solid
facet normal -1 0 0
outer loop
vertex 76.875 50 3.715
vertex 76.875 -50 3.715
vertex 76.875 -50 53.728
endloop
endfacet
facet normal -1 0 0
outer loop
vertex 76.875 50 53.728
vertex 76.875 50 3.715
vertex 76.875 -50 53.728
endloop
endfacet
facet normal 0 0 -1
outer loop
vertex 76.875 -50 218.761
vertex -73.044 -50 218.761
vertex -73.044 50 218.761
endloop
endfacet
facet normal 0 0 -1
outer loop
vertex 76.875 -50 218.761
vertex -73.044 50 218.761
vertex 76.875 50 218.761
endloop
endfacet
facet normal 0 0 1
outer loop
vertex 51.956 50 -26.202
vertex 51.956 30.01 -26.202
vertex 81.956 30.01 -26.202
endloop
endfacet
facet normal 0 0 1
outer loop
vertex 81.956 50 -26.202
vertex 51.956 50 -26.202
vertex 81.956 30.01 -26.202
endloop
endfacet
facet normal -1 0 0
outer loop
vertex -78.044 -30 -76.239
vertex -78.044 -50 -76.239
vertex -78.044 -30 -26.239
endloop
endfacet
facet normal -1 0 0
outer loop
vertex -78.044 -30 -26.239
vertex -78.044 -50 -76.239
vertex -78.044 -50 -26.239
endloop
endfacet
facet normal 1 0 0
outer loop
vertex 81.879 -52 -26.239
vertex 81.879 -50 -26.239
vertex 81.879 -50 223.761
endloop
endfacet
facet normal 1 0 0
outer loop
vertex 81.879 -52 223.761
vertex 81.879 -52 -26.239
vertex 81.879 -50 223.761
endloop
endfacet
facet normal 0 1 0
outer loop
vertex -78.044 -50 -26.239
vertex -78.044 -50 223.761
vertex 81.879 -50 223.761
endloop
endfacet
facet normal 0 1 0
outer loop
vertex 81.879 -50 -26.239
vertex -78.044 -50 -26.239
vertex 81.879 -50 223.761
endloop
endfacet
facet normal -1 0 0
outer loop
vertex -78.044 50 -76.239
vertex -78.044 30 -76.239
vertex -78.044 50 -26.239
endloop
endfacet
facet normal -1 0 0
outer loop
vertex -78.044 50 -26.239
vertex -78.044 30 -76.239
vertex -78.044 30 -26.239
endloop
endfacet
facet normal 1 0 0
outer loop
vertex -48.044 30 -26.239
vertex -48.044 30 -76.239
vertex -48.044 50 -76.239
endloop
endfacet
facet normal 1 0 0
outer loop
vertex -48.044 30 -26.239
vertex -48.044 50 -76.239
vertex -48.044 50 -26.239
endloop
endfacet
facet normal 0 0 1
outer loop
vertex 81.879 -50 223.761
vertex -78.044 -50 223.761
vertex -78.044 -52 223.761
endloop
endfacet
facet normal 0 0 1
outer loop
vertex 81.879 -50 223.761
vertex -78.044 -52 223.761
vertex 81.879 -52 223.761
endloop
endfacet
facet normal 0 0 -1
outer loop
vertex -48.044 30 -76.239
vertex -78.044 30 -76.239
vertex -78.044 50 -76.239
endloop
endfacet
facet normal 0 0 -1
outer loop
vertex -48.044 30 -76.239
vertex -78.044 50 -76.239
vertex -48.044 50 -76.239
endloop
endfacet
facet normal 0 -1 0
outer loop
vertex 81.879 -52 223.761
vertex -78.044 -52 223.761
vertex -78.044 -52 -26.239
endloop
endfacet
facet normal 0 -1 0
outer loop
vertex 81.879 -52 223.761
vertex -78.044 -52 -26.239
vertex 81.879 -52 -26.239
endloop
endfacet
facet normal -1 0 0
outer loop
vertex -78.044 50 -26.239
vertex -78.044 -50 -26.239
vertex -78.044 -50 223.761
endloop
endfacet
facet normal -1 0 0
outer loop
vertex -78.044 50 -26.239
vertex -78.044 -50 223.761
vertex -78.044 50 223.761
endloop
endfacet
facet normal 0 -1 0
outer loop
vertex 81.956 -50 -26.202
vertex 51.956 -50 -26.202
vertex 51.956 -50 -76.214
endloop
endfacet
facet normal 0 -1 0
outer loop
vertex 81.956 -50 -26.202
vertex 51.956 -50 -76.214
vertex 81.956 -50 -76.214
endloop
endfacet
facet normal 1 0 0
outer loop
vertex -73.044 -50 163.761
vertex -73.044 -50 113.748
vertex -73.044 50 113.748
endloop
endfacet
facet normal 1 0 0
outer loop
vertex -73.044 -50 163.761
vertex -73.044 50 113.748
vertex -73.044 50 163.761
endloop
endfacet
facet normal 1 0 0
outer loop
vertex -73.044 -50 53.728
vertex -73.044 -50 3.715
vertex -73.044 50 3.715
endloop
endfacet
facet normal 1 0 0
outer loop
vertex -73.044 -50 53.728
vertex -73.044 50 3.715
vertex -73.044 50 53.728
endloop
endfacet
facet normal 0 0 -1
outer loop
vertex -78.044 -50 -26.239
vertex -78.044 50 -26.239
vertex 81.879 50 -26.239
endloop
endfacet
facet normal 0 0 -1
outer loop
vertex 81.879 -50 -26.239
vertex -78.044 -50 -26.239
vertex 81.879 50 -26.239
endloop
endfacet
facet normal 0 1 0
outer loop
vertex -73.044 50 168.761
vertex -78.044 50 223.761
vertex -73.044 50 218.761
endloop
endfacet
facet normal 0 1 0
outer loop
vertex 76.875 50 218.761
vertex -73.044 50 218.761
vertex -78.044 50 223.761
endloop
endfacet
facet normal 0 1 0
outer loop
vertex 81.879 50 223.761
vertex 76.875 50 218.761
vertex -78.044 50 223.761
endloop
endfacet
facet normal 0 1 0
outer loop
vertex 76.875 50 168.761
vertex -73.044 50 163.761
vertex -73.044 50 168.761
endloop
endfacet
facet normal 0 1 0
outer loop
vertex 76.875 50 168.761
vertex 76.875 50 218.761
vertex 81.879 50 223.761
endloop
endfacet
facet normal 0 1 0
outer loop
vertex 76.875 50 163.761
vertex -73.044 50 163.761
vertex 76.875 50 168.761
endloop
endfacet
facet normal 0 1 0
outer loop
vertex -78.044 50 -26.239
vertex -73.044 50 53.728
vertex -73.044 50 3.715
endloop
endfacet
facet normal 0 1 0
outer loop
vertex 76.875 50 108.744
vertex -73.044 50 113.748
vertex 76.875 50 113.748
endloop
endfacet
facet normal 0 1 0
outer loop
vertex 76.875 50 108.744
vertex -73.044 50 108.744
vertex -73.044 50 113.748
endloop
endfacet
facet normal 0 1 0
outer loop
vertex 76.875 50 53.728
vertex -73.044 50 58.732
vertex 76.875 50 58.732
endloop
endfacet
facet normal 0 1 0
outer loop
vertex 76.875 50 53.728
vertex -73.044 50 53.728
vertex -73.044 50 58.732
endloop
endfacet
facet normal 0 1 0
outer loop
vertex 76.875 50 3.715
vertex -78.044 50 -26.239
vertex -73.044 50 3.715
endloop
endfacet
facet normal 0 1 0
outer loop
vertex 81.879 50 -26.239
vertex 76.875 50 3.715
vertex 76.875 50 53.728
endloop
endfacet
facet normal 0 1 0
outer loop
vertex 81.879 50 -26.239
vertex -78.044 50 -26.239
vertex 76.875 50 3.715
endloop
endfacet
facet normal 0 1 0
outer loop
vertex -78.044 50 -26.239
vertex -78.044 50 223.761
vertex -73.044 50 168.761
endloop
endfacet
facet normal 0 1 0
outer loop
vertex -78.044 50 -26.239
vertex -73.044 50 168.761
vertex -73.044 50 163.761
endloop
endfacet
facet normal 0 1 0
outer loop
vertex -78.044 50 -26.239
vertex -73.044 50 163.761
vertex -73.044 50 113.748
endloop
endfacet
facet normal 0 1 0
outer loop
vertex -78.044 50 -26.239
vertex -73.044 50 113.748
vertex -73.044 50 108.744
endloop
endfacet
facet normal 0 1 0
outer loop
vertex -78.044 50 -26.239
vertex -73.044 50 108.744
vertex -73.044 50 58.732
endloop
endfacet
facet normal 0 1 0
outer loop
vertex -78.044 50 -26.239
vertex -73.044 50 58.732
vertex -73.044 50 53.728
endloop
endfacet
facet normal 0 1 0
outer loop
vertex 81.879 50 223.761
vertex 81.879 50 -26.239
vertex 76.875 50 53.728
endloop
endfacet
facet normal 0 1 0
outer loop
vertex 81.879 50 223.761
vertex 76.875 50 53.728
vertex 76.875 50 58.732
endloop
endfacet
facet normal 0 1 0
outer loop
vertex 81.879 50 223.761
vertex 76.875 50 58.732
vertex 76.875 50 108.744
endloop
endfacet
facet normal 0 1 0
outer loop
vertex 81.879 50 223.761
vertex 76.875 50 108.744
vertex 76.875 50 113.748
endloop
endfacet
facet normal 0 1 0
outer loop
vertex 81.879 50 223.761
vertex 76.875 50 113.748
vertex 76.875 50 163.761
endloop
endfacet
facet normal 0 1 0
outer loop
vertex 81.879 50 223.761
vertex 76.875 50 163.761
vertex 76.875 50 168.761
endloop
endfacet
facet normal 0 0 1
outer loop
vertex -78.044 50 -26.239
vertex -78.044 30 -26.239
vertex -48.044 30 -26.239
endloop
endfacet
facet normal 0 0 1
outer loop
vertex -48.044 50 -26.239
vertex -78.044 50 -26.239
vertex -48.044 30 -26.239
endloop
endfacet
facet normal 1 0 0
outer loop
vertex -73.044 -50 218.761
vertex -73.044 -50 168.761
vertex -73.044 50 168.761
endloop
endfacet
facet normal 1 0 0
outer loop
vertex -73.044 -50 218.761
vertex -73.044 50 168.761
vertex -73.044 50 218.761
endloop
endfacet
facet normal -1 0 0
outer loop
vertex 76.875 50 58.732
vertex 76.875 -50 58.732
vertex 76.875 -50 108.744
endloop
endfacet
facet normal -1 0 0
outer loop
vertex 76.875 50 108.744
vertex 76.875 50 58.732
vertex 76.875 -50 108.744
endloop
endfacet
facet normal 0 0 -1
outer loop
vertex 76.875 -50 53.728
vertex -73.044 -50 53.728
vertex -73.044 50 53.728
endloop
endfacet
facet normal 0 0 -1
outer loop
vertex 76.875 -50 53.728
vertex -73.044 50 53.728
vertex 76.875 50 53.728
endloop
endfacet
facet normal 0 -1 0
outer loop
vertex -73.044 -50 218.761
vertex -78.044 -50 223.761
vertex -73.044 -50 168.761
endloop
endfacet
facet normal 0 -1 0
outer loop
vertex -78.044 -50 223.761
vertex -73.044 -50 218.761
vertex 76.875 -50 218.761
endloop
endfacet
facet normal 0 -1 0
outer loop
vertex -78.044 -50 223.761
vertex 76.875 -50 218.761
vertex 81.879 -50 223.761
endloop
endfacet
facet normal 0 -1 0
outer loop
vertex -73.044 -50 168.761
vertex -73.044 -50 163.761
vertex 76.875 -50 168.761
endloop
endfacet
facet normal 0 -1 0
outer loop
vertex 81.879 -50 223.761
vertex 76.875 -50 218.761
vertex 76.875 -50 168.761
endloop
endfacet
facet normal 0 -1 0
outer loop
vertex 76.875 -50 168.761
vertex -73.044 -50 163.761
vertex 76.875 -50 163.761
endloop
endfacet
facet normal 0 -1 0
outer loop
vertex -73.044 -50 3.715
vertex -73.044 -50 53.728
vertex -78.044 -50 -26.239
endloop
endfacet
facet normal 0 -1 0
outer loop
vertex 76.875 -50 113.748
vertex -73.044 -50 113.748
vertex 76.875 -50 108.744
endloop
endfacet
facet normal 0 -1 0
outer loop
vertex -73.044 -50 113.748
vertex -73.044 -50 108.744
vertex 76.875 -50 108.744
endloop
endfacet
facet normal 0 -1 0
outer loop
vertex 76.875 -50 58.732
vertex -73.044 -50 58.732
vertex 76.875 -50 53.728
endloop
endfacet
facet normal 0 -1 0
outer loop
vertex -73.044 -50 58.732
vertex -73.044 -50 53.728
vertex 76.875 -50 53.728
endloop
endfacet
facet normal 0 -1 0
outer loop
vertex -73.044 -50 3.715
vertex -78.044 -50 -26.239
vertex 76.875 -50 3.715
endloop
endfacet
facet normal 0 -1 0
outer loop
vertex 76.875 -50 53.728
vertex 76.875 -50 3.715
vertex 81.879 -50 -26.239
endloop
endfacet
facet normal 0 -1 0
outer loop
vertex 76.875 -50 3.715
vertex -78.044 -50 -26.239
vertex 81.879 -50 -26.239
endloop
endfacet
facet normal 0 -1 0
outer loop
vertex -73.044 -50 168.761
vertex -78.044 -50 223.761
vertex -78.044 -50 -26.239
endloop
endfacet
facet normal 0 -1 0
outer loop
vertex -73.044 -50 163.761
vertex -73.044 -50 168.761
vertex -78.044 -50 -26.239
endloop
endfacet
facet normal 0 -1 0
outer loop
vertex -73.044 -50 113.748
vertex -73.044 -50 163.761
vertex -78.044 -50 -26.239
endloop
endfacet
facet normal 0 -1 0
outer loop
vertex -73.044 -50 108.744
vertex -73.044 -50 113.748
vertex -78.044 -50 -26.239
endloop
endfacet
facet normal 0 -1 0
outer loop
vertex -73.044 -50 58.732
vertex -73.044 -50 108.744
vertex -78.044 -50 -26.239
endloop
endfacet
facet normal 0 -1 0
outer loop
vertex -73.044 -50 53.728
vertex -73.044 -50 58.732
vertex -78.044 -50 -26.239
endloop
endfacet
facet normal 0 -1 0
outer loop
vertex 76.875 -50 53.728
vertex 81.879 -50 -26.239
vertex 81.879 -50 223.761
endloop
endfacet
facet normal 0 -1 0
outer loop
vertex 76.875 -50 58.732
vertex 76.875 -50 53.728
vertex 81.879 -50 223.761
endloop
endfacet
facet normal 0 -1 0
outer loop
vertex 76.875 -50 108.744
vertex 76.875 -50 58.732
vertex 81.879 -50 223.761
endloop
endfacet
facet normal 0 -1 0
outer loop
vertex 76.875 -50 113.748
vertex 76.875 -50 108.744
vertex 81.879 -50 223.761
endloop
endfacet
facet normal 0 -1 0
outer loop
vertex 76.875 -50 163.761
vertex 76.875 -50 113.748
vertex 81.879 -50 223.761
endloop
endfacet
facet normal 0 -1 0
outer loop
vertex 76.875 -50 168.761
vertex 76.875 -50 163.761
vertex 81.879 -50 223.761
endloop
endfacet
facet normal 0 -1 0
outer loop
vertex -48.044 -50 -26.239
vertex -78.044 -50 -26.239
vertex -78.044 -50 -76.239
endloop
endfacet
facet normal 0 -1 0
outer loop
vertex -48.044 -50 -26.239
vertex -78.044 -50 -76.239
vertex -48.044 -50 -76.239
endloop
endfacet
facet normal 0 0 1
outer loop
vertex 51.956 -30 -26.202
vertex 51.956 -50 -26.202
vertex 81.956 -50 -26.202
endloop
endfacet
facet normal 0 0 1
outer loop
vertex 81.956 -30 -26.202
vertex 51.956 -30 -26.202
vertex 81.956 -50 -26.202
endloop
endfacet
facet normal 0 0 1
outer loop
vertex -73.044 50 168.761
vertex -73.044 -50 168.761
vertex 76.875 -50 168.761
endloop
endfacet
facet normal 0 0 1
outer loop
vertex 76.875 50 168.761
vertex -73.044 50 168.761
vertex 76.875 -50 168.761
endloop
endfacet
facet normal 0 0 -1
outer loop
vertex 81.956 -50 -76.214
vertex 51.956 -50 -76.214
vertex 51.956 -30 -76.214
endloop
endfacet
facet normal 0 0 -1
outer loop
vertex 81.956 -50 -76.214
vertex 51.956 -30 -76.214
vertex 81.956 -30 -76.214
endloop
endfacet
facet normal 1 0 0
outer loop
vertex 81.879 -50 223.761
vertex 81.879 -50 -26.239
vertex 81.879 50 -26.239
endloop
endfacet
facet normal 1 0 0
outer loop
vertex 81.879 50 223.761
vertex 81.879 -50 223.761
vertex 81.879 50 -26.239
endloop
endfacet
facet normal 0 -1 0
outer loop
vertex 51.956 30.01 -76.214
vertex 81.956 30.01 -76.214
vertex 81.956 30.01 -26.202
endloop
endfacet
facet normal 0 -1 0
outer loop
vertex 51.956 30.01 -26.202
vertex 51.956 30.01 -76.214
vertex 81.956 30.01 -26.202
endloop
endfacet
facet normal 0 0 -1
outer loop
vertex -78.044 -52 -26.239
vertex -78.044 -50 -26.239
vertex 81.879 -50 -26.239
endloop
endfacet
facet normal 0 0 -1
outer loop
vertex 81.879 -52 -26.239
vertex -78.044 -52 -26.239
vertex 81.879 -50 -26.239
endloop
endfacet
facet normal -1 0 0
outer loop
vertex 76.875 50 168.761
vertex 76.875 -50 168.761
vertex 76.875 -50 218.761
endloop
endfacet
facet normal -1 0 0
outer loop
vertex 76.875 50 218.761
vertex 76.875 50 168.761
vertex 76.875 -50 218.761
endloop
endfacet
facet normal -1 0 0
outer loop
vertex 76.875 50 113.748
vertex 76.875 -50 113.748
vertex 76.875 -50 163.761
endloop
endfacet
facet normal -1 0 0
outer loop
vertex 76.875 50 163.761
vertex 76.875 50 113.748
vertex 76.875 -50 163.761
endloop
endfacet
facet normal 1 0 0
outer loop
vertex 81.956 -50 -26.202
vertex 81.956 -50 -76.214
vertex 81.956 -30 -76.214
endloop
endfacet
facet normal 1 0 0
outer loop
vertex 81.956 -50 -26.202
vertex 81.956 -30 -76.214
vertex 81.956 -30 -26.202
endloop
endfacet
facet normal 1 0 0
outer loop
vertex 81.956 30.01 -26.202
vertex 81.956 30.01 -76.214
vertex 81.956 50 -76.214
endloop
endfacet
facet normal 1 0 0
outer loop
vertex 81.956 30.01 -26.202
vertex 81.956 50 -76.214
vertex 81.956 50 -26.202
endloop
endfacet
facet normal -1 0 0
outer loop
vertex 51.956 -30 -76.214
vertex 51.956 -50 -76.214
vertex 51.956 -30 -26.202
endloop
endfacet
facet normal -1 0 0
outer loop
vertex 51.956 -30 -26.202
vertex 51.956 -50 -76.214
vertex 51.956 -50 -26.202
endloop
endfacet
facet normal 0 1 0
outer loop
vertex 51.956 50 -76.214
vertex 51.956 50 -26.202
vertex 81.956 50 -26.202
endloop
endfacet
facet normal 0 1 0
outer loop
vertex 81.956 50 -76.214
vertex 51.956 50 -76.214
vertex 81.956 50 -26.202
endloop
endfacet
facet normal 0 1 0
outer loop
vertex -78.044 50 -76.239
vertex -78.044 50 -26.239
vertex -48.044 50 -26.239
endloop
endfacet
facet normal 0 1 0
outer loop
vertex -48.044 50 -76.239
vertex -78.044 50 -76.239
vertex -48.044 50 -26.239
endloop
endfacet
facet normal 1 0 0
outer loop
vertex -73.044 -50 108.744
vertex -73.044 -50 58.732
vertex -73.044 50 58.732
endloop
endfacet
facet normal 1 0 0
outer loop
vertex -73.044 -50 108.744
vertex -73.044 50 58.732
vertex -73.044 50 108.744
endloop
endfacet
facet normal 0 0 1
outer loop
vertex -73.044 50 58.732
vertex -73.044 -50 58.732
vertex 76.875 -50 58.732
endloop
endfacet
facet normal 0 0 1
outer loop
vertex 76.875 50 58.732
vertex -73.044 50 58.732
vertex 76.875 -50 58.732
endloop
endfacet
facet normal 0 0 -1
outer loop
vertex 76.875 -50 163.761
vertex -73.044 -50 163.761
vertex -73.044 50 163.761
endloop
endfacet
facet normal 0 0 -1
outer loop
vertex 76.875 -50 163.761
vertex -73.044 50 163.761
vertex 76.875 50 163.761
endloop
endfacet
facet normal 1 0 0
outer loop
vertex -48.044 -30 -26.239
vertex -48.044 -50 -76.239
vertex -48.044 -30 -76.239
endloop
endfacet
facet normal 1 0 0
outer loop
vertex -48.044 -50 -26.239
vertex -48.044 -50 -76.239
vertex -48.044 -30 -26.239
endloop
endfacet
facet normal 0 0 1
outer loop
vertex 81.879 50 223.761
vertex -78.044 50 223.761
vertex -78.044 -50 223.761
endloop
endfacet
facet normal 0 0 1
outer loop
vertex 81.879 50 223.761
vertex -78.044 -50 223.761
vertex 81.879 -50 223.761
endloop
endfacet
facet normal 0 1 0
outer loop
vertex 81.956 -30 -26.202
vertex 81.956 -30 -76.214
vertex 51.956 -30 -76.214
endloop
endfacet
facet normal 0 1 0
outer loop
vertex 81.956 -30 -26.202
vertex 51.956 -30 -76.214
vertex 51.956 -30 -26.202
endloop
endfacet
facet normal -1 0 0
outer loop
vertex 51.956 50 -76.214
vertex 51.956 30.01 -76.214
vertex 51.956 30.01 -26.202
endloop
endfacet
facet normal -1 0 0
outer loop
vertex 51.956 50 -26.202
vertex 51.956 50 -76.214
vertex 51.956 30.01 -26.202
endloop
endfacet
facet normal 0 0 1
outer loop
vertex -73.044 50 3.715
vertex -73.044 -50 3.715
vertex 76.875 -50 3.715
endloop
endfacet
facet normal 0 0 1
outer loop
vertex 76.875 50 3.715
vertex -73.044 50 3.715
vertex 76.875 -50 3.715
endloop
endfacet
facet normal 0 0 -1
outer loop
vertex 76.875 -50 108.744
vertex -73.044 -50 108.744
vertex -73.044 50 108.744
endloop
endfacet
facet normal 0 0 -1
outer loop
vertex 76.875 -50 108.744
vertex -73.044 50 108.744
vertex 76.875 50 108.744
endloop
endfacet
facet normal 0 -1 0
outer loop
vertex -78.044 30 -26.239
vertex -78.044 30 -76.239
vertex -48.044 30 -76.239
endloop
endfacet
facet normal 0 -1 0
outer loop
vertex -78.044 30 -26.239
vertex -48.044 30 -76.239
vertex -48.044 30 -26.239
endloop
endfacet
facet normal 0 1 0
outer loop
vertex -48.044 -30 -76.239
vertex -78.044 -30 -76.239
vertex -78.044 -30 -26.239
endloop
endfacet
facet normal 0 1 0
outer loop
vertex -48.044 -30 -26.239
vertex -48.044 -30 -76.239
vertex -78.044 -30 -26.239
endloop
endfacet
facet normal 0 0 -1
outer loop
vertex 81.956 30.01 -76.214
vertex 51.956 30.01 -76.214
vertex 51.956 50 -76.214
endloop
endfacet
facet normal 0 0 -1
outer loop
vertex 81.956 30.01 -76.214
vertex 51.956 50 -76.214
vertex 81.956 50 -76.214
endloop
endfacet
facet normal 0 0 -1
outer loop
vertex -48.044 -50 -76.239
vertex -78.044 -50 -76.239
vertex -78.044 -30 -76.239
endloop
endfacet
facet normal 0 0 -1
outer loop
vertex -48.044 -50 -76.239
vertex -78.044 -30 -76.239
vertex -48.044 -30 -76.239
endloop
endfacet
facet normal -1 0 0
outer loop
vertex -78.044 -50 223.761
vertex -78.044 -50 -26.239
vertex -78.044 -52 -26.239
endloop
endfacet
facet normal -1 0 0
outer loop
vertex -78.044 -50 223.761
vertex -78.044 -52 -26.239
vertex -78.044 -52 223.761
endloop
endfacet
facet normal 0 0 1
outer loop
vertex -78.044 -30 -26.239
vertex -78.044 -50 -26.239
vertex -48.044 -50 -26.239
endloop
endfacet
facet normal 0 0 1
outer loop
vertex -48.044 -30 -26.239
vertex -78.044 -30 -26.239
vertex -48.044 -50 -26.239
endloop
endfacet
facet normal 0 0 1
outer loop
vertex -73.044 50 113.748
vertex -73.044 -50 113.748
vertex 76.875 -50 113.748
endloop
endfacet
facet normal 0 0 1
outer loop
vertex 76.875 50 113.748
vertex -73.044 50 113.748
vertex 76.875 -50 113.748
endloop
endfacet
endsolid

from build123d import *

# Parameters (mm, degrees)
F0_W      = 30
F0_H      = 50
F1_DEPTH  = 50
F0_H_2    = 50.0126
F2_W      = 159.9221400055
F2_H      = 100
F3_DEPTH  = 250
F4_W      = 149.9183373862
F4_H      = 50
F5_DEPTH  = 100.001
F6_W      = 149.9183400055
F6_H      = 50.0126
F7_DEPTH  = 100.001
F8_W      = 149.9183400055
F8_H      = 50.0126
F9_DEPTH  = 100.001
F10_W     = 149.9183400055
F10_H     = 50.0126
F11_DEPTH = 100.001
F12_W     = 60.0102
F12_H     = 50.0126
F13_DEPTH = 160.001
F14_W     = 60
F14_H     = 50
F15_DEPTH = 160.001
F16_W     = 159.9221400055
F16_H     = 250
F17_DEPTH = 2


with BuildPart() as f1:
    # F0 (on Front) → F1 (new body, symmetric)
    with BuildSketch(Plane.XZ):
        with Locations((-63.0435375008, -51.2394877252)):
            Rectangle(F0_W, F0_H)
    extrude(amount=F1_DEPTH, both=True)

    # F14 (on face) → F15 (cut, through all)
    with BuildSketch(Plane(origin=(-78.0435375008, 0, 0), x_dir=(0, -1, 0), z_dir=(-1, 0, 0))):
        with Locations((0, -51.2394877252)):
            Rectangle(F14_W, F14_H)
    extrude(amount=-F15_DEPTH, mode=Mode.SUBTRACT)


with BuildPart() as f1b:
    # F0 (on Front) → F1, piece 2 (new body, symmetric)
    with BuildSketch(Plane.XZ):
        with Locations((66.9564624992, -51.2079236825)):
            Rectangle(F0_W, F0_H_2)
    extrude(amount=F1_DEPTH, both=True)

    # F12 (on face) → F13 (cut, through all)
    with BuildSketch(Plane.YZ.offset(81.9564624992)):
        with Locations((0.0051, -51.2079236825)):
            Rectangle(F12_W, F12_H)
    extrude(amount=-F13_DEPTH, mode=Mode.SUBTRACT)


with BuildPart() as f3:
    # F2 (on face) → F3 (new body)
    with BuildSketch(Plane.XY.offset(-26.2394877252)):
        with Locations((1.917532502, 0)):
            Rectangle(F2_W, F2_H)
    extrude(amount=F3_DEPTH)

    # F4 (on face) → F5 (cut, through all)
    with BuildSketch(Plane.XZ.offset(50)):
        with Locations((1.9156311923, 193.7605122748)):
            Rectangle(F4_W, F4_H)
    extrude(amount=-F5_DEPTH, mode=Mode.SUBTRACT)

    # F6 (on face) → F7 (cut, through all)
    with BuildSketch(Plane.XZ.offset(50)):
        with Locations((1.915632502, 138.7542122748)):
            Rectangle(F6_W, F6_H)
    extrude(amount=-F7_DEPTH, mode=Mode.SUBTRACT)

    # F8 (on face) → F9 (cut, through all)
    with BuildSketch(Plane.XZ.offset(50)):
        with Locations((1.915632502, 83.7378122748)):
            Rectangle(F8_W, F8_H)
    extrude(amount=-F9_DEPTH, mode=Mode.SUBTRACT)

    # F10 (on face) → F11 (cut, through all)
    with BuildSketch(Plane.XZ.offset(50)):
        with Locations((1.915632502, 28.7214122748)):
            Rectangle(F10_W, F10_H)
    extrude(amount=-F11_DEPTH, mode=Mode.SUBTRACT)


with BuildPart() as f17:
    # F16 (on face) → F17 (new body)
    with BuildSketch(Plane.XZ.offset(50)):
        with Locations((1.917532502, 98.7605122748)):
            Rectangle(F16_W, F16_H)
    extrude(amount=F17_DEPTH)


solid = Compound([f1.part, f1b.part, f3.part, f17.part])
